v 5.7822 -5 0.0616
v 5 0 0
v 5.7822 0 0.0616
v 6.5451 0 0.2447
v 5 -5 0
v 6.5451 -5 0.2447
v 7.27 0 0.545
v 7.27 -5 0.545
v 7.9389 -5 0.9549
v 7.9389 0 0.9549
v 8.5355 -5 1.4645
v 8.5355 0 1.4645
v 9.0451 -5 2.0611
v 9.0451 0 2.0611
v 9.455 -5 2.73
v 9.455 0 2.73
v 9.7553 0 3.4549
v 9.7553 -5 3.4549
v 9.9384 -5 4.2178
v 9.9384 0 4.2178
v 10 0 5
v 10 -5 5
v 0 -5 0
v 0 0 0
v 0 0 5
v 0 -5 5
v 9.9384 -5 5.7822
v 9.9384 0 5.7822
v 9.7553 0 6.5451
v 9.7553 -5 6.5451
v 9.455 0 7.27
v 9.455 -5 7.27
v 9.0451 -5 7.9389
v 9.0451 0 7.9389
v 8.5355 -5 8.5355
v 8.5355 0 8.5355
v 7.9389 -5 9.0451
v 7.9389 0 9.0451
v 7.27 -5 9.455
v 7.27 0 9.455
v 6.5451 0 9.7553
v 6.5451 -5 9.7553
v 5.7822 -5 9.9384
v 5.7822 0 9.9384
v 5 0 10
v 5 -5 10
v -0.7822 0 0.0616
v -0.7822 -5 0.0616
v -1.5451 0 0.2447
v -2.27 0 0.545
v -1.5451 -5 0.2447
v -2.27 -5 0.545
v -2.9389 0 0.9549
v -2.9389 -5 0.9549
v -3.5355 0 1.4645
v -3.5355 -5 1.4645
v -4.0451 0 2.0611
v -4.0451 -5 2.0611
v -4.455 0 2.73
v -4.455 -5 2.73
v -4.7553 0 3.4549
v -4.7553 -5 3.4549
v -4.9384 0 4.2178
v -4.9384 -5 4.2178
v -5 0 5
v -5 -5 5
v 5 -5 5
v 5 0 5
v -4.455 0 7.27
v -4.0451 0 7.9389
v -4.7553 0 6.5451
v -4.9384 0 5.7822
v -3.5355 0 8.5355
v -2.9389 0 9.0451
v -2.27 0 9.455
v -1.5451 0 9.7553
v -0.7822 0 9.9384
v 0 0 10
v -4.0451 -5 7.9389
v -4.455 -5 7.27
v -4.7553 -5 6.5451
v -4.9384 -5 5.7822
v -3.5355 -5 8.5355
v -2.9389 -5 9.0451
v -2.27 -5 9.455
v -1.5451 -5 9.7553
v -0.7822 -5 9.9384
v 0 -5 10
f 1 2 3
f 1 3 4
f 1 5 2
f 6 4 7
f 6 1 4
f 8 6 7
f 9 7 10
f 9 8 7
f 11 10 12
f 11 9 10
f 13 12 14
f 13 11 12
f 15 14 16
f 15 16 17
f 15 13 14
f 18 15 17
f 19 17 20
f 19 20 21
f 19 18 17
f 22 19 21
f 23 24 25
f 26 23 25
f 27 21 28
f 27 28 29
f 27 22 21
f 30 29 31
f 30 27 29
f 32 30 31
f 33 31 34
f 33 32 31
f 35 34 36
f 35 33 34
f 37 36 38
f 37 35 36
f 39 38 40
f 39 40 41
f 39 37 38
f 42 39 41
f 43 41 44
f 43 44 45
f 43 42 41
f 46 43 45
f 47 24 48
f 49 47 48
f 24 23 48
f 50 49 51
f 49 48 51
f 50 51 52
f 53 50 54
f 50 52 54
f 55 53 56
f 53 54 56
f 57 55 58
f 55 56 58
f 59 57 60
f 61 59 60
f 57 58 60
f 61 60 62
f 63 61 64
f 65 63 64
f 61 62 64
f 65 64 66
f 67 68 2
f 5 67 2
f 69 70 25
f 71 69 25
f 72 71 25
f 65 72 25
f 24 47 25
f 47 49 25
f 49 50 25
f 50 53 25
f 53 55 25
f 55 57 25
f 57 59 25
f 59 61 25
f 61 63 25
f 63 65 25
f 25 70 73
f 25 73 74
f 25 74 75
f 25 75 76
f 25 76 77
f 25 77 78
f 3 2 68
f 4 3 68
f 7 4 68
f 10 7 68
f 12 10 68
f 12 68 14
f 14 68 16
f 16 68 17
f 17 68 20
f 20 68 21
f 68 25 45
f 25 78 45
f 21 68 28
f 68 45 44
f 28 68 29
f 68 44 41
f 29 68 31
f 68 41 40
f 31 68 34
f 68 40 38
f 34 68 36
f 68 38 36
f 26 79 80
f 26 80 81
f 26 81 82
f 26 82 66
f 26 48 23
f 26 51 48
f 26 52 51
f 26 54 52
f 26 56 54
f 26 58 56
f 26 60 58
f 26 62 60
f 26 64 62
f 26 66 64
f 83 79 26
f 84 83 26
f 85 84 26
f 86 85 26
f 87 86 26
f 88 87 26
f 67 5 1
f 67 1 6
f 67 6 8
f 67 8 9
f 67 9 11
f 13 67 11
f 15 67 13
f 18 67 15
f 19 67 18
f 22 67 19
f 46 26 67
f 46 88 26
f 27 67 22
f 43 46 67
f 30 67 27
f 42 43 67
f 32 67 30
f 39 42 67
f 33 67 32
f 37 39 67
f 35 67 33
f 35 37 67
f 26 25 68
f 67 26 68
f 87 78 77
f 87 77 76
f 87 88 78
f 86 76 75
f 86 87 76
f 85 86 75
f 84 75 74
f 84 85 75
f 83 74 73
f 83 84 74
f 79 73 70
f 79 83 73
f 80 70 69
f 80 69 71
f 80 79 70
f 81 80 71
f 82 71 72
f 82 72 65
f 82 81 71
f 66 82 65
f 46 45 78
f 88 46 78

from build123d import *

# Parameters (mm, degrees)
F1_DEPTH = 5
F2_R     = 4.99999


# Not quite as in the source:
# - a fillet or chamfer is up to 0.001 mm smaller than in the source, because OpenCascade refuses the exact size


with BuildPart() as f1:
    # F0 (on Front) → F1 (new body)
    with BuildSketch(Plane.XZ):
        Polygon((-5, 0), (0, 0), (0, 5), (5, 5), (5, 0), (10, 0), (10, 10), (-5, 10), align=None)
    extrude(amount=F1_DEPTH)

    # F2 (radius 5 in the source; OpenCascade refuses exactly that, so slightly less here)
    f2_edges = [f1.edges().sort_by_distance(p)[0] for p in [
        (10, -2.5, 10),
        (10, -2.5, 0),
        (-5, -2.5, 10),
        (-5, -2.5, 0),
    ]]
    fillet(f2_edges, radius=F2_R)


solid = f1.part
